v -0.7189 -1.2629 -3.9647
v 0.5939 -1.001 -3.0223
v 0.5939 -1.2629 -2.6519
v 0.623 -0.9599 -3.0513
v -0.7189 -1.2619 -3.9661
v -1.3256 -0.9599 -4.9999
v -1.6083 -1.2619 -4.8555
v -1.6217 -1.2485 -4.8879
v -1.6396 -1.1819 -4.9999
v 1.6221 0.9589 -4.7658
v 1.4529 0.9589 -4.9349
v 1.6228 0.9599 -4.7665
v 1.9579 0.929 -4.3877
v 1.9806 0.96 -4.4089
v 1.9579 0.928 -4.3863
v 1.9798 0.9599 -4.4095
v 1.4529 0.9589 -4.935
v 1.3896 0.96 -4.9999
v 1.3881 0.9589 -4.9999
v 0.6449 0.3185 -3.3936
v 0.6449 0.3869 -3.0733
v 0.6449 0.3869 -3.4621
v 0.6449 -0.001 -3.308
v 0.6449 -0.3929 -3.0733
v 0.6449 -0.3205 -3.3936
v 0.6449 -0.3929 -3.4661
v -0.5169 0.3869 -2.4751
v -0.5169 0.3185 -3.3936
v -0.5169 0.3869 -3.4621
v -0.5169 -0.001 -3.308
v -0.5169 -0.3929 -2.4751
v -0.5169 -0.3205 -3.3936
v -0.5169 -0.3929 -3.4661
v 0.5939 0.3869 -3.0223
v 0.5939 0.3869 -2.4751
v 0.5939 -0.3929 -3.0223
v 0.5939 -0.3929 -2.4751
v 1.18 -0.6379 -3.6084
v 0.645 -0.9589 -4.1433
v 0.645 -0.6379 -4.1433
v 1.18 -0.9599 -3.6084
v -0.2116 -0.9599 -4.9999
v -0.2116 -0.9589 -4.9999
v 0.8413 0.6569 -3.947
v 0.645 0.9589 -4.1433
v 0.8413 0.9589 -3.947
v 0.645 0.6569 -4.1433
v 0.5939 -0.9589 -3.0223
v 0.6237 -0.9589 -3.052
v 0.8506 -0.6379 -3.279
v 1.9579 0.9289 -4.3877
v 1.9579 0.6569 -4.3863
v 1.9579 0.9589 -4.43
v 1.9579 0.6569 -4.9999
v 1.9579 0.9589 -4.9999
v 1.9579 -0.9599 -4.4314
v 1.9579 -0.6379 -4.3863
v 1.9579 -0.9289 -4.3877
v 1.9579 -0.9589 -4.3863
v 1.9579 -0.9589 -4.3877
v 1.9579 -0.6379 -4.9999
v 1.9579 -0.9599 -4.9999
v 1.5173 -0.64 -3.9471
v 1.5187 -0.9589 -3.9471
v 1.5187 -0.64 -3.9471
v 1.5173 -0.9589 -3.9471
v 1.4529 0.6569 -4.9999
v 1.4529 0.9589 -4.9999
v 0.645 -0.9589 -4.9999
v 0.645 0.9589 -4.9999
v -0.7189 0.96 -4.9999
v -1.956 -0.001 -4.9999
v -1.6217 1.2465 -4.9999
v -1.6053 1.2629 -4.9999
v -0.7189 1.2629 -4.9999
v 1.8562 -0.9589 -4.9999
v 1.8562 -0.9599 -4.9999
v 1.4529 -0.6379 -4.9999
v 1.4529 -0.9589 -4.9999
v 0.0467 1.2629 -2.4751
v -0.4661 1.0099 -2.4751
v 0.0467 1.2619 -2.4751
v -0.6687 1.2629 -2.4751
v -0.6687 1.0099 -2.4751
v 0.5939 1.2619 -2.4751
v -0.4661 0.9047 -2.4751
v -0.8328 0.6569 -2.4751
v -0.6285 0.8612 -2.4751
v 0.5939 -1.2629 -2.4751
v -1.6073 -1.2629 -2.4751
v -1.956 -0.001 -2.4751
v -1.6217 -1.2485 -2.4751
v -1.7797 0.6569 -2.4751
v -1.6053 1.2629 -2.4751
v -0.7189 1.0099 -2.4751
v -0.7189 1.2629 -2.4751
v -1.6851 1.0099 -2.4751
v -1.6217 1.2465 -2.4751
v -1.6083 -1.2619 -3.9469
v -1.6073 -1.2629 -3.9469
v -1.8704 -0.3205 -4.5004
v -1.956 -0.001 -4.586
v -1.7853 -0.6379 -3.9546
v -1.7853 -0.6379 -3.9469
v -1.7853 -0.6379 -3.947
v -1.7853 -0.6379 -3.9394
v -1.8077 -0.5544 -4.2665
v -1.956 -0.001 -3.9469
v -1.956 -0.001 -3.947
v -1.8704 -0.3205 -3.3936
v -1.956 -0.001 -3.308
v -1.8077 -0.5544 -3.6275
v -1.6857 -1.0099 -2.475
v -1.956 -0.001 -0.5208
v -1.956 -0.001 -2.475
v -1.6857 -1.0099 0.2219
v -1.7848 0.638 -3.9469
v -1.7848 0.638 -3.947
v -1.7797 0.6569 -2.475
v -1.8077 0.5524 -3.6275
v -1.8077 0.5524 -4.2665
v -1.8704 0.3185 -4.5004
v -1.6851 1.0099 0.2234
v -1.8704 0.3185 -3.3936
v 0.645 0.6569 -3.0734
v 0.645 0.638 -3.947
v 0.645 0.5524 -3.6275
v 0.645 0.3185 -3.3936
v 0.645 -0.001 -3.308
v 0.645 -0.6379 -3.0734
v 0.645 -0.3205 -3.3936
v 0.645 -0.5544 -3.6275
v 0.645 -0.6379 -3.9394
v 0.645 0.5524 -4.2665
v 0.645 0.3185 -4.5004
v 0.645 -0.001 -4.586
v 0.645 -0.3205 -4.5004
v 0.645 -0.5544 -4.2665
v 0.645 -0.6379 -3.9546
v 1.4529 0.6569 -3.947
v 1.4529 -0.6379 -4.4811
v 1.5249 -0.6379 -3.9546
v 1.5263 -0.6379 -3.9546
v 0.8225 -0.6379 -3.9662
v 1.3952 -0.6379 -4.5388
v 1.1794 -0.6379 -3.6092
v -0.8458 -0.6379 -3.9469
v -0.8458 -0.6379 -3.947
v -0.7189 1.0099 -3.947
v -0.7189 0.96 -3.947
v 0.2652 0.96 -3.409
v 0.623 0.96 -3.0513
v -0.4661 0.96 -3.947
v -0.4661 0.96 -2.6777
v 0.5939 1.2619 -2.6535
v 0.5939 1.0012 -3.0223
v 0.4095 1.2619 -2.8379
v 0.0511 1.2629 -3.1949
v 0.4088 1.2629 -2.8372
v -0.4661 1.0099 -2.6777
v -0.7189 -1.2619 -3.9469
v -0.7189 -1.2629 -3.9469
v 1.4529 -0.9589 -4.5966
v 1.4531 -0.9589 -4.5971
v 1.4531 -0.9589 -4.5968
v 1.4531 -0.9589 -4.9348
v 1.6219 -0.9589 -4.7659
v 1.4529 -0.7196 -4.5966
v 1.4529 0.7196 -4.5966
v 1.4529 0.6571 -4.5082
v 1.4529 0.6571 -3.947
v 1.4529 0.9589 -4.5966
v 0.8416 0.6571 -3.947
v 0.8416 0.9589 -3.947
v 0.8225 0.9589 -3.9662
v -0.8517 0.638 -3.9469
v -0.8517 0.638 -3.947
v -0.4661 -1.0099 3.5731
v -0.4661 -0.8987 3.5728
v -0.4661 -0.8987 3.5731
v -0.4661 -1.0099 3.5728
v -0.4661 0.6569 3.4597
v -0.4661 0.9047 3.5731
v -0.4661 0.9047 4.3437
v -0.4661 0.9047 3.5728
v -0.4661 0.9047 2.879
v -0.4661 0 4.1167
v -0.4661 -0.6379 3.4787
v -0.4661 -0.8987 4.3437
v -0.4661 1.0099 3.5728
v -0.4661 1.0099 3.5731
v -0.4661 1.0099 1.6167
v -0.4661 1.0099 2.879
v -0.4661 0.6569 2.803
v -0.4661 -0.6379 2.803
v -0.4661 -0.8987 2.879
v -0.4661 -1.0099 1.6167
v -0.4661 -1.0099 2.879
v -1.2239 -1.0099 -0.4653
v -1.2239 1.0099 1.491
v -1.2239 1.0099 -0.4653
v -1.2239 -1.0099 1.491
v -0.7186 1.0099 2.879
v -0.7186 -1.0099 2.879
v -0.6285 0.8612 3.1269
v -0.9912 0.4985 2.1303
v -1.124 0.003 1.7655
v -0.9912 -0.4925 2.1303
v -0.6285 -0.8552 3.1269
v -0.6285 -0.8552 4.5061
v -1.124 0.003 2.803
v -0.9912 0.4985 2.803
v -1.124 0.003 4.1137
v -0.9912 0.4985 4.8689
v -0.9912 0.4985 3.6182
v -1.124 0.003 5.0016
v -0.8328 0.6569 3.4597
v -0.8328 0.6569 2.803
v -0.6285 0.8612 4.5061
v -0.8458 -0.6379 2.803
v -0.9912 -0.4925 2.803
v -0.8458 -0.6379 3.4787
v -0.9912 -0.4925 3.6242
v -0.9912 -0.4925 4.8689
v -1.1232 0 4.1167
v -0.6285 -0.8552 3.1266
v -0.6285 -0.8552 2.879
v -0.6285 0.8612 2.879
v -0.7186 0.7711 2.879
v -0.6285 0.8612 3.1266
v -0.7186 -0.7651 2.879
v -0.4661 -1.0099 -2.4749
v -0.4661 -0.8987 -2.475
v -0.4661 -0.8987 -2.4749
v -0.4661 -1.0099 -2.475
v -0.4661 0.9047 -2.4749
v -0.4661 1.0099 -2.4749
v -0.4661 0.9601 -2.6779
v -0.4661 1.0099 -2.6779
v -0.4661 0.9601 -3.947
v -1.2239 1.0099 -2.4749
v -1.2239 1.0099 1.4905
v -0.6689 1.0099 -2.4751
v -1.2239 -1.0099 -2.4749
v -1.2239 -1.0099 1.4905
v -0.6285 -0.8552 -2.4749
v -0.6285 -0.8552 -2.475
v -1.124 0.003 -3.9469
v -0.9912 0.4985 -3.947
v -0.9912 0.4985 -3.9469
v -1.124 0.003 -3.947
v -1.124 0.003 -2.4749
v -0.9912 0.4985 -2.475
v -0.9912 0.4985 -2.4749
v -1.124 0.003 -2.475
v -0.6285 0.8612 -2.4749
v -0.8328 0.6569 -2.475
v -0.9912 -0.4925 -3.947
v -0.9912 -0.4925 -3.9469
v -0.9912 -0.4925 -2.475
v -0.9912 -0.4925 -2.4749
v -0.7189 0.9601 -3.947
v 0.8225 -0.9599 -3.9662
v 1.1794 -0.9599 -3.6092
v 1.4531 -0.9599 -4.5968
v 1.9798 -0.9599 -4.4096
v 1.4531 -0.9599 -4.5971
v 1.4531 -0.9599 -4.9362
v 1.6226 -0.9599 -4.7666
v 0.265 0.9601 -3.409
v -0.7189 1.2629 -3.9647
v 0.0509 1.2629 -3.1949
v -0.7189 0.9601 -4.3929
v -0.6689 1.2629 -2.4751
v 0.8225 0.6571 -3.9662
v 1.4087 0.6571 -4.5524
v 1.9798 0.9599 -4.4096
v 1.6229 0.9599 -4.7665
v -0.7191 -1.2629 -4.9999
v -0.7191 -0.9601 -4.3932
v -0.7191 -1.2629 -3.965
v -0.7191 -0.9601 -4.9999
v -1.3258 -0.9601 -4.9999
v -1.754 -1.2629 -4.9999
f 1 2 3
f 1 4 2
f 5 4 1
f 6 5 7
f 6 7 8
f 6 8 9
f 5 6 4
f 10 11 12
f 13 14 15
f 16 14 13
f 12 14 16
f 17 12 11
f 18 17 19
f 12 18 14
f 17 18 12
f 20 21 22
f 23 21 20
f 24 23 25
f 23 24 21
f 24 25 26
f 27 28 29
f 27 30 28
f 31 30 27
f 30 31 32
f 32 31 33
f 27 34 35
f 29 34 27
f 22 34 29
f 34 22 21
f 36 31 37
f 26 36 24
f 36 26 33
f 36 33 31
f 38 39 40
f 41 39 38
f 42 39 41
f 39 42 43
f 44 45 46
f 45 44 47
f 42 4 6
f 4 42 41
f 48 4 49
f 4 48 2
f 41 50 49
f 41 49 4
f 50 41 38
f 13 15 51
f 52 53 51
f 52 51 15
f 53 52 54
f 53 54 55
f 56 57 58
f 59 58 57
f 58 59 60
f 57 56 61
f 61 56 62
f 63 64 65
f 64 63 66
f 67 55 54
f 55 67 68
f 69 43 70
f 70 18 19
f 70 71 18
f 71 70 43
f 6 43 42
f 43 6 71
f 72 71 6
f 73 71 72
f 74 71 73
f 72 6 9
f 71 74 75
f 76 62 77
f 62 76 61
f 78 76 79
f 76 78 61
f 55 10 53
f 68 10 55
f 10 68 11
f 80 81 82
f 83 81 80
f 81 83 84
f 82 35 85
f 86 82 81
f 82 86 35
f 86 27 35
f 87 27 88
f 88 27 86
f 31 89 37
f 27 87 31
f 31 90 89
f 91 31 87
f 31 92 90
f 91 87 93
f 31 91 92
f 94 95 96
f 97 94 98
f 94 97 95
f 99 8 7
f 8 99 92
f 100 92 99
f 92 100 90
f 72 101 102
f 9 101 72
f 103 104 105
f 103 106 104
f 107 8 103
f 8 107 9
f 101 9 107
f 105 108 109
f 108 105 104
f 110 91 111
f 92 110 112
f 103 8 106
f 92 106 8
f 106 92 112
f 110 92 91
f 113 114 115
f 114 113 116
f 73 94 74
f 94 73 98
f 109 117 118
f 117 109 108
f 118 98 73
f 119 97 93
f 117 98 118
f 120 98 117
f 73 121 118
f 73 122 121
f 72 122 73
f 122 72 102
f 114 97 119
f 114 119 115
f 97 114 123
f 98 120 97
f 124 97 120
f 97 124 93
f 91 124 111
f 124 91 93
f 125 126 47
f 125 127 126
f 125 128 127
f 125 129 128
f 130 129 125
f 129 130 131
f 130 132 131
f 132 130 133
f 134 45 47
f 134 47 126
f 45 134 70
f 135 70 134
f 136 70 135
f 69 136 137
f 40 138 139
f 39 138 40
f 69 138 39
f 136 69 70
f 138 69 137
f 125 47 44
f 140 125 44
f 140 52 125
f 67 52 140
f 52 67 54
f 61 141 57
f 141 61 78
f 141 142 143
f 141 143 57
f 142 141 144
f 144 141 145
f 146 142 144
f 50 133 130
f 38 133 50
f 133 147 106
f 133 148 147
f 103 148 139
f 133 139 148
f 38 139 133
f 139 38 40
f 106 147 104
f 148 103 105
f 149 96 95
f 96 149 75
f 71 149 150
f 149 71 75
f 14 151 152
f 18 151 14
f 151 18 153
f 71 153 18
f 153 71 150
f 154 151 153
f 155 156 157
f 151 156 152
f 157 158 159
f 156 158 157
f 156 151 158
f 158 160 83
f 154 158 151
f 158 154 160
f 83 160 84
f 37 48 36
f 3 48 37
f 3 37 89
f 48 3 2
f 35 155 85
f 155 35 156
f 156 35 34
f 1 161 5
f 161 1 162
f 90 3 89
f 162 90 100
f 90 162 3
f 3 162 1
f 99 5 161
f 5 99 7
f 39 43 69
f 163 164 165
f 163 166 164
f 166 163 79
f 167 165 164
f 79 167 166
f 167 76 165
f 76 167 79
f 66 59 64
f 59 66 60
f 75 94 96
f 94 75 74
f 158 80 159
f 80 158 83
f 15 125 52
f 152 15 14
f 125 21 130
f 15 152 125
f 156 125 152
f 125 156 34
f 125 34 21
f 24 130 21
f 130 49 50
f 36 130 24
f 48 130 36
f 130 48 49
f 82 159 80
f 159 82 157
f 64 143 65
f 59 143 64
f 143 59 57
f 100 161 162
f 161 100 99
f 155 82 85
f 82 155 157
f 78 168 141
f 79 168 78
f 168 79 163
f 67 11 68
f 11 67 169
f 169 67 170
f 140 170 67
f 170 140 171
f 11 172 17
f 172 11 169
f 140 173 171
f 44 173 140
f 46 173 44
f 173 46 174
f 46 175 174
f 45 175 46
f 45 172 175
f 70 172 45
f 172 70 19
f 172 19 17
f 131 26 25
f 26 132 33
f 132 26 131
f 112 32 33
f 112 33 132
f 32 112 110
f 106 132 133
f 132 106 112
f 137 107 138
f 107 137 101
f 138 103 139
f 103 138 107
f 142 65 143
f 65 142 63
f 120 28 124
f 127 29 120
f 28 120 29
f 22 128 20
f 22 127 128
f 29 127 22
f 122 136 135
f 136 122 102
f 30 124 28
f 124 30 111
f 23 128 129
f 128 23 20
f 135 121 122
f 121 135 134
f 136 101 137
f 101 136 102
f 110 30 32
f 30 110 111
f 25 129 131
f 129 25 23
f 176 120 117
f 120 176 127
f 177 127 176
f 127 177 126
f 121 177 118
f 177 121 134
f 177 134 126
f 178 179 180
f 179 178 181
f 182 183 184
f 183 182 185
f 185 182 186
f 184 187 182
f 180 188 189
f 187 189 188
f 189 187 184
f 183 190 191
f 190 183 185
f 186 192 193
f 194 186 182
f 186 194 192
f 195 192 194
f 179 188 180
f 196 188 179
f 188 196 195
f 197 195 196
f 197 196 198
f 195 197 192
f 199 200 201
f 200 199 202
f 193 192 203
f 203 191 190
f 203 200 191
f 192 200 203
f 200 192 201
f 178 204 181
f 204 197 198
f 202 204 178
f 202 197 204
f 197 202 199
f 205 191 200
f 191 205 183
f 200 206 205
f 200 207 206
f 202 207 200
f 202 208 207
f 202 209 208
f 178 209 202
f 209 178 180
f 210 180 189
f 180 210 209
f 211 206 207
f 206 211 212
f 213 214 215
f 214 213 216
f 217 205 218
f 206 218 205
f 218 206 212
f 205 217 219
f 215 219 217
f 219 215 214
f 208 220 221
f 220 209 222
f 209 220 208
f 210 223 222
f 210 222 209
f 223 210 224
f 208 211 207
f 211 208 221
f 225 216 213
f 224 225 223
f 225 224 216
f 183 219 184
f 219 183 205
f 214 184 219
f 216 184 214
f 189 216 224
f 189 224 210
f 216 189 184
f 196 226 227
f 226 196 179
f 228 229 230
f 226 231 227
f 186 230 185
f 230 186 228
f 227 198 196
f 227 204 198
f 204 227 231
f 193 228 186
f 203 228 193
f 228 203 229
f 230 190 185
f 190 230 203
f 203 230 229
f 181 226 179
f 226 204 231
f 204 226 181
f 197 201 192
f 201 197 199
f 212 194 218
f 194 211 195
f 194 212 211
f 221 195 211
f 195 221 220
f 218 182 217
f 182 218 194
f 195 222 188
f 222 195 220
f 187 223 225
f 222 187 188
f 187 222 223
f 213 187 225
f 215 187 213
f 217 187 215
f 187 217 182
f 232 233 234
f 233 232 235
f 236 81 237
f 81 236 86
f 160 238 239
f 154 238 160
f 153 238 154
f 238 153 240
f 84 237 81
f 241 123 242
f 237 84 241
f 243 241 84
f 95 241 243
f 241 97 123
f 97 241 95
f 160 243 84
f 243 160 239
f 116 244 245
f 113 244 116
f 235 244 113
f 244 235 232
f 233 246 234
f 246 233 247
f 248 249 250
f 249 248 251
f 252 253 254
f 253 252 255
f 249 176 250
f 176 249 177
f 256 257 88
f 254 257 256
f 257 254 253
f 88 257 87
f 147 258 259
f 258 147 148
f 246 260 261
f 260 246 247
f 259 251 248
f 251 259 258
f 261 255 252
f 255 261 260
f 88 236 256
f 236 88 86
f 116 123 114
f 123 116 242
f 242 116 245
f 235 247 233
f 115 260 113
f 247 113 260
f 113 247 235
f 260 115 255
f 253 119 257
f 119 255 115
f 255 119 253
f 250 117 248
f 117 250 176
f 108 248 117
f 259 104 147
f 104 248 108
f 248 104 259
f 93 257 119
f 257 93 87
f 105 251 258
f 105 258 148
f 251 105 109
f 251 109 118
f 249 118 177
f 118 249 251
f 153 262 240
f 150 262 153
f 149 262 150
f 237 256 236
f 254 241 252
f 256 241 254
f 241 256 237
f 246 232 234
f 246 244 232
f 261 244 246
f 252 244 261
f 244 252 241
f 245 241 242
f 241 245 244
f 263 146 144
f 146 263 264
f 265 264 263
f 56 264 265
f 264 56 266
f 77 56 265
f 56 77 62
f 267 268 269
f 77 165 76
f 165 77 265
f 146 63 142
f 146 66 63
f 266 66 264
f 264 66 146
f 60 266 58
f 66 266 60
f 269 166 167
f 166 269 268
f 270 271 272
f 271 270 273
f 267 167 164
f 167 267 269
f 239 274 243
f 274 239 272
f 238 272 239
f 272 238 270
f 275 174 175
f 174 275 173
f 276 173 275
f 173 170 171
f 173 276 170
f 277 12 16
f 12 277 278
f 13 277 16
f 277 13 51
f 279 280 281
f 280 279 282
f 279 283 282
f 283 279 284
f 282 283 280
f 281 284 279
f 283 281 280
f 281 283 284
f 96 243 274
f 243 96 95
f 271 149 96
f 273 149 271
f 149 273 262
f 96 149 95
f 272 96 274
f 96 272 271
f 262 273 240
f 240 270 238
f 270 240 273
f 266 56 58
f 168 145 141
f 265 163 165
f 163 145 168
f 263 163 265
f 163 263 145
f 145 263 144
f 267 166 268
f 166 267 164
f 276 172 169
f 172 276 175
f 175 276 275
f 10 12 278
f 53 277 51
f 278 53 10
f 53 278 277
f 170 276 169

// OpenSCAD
intersection() {
  translate([-0.0005, 0, 0])
  cube(size = [4.6988, 3.0298, 11.9998], center = true);

  union() {
    intersection() {
      union() {
        difference() {
          translate([-3.896, 5.50978, 3.896])
          rotate([-135, -45, 0])
          cube(size = [36.1998, 20.6158, 36.1998], center = true);
        
          translate([0.064, -0.003, 7.0765])
          cube(size = [1.1619, 0.7799, 22.0469], center = true);
        }
      
        translate([-12.2086, -0.6765, -1.80418])
        rotate([90, 45, 0])
        cube(size = [21.4858, 16.3828, 0.5668], center = true);
      
        translate([-8.071, -0.0005, -4.4735])
        cube(size = [20.0578, 1.9188, 1.0528], center = true);
      }
    
      difference() {
        difference() {
          translate([0.539, -0.001, -3.7375])
          cylinder(h = 2.5248, r1 = 2.495, r2 = 2.495, center = true, $fn = 12);
        
          translate([9.3725, 0.0095, 6.55])
          cube(size = [17.4549, 1.2949, 23.0999], center = true);
        }
      
        difference() {
          translate([8.6905, 1.1115, -10.2875])
          cube(size = [18.8189, 0.3029, 15.6249], center = true);
        
          translate([1.71737, -5.50978, 9.50937])
          rotate([-135, -45, 0])
          cube(size = [20.323, 36.2, 20.616], center = true);
        }
      }
    
      union() {
        difference() {
          union() {
            translate([-0.0625, -1.1115, -3.7375])
            cube(size = [1.3128, 0.3028, 2.5248], center = true);
          
            translate([-12.2086, -0.151, -1.80418])
            rotate([90, 45, 0])
            cube(size = [21.4858, 16.3828, 2.2218], center = true);
          }
        
          translate([-12.2086, 0.0095, -1.80418])
          rotate([90, 45, 0])
          cube(size = [21.4859, 16.3829, 1.2949], center = true);
        }
      
        difference() {
          union() {
            translate([-7.00637, 0.152, -7.00637])
            rotate([90, 45, 0])
            cube(size = [36.1998, 16.3828, 2.2218], center = true);
          
            translate([-8.753, -0.0005, -3.211])
            cube(size = [18.6938, 2.5248, 1.4718], center = true);
          }
        
          union() {
            translate([1.049, -0.152, -4.4735])
            cube(size = [0.8079, 2.2219, 1.0529], center = true);
          
            translate([-8.071, -0.001, -3.947])
            rotate([180, 90, -180])
            cylinder(h = 20.0579, r1 = 0.639, r2 = 0.639, center = true, $fn = 12);
          }
        }
      }
    }
  
    difference() {
      intersection() {
        union() {
          difference() {
            translate([-0.845, 0, 0])
            cube(size = [0.7578, 2.0198, 36.1998], center = true);
          
            translate([-9.28416, 0, 3.37916])
            rotate([90, 20, 0])
            cube(size = [16.4399, 36.1999, 2.0199], center = true);
          }
        
          intersection() {
            translate([-0.133, 0.003, 7.8125])
            rotate([180, 0, 180])
            cylinder(h = 20.5748, r1 = 0.991, r2 = 0.991, center = true, $fn = 12);
          
            translate([-0.845, 0, 0])
            rotate([135, 0, 0])
            cube(size = [0.7578, 36.1998, 36.1998], center = true);
          }
        }
      
        translate([-5.42987, 8.545, -5.42987])
        rotate([90, 45, 0])
        cube(size = [36.1998, 20.8418, 19.1098], center = true);
      }
    
      union() {
        difference() {
          translate([7.72427, 8.545, -2.81141])
          rotate([90, 20, 0])
          cube(size = [19.7599, 36.1999, 19.1099], center = true);
        
          union() {
            translate([-0.133, 0.003, 7.8125])
            rotate([180, 0, 180])
            cylinder(h = 20.575, r1 = 0.991, r2 = 0.991, center = true, $fn = 12);
          
            translate([-9.283, 0, -7.6105])
            cube(size = [17.634, 36.2, 20.979], center = true);
          }
        }
      
        intersection() {
          union() {
            translate([8.0386, 8.545, -2.92581])
            rotate([90, 20, 0])
            cube(size = [19.0909, 36.1999, 19.1099], center = true);
          
            translate([8.438, 0.0095, 10.4515])
            cube(size = [19.3239, 1.2949, 15.2969], center = true);
          }
        
          translate([0, 0.000353553, -10.7399])
          rotate([135, 0, 0])
          cube(size = [36.1999, 21.0109, 21.0099], center = true);
        }
      }
    }
  
    difference() {
      intersection() {
        union() {
          difference() {
            translate([-9.283, 0, -7.6105])
            cube(size = [17.6338, 2.0198, 20.9788], center = true);
          
            translate([-0.133, 0.003, -7.6485])
            rotate([180, 0, 180])
            cylinder(h = 20.9029, r1 = 0.991, r2 = 0.991, center = true, $fn = 12);
          }
        
          intersection() {
            translate([-9.28416, 9.3785, 3.37916])
            rotate([90, 20, 0])
            cube(size = [16.4398, 36.1998, 17.4428], center = true);
          
            translate([-9.662, -5.36977, -5.36977])
            rotate([135, 0, 0])
            cube(size = [16.8758, 36.1998, 21.0098], center = true);
          }
        }
      
        union() {
          difference() {
            translate([7.72427, 0, -2.81141])
            rotate([90, 20, 0])
            cube(size = [19.7598, 36.1998, 2.0198], center = true);
          
            translate([-9.283, -8.7215, -3.211])
            cube(size = [17.6339, 18.7569, 1.4719], center = true);
          }
        
          difference() {
            translate([0.539, -0.001, -3.211])
            cylinder(h = 1.4718, r1 = 2.495, r2 = 2.495, center = true, $fn = 12);
          
            translate([0, -0.001, -3.947])
            rotate([180, 90, -180])
            cylinder(h = 36.1999, r1 = 0.639, r2 = 0.639, center = true, $fn = 12);
          }
        }
      }
    
      union() {
        difference() {
          translate([-9.283, 0.000353553, -10.7399])
          rotate([135, 0, 0])
          cube(size = [17.6339, 21.0109, 21.0099], center = true);
        
          translate([0.539, -0.001, -0.534])
          cylinder(h = 6.826, r1 = 2.495, r2 = 2.495, center = true, $fn = 12);
        }
      
        translate([-0.133, 0.003, -11.0235])
        rotate([180, 0, 180])
        cylinder(h = 14.1529, r1 = 0.991, r2 = 0.991, center = true, $fn = 12);
      
        translate([-0.845, 0, 0.202])
        cube(size = [0.7579, 2.0199, 5.3539], center = true);
      }
    }
  
    intersection() {
      union() {
        translate([-11.0813, -5.50978, -3.28927])
        rotate([-135, -45, 0])
        cube(size = [15.8768, 36.1998, 20.6158], center = true);
      
        translate([-7.18527, 0.0005, -7.18527])
        rotate([90, 45, 0])
        cube(size = [36.1998, 15.8768, 1.9188], center = true);
      
        translate([6.20309, 0.8085, -8.9898])
        rotate([90, 45, 0])
        cube(size = [14.7138, 0.5048, 0.3028], center = true);
      
        translate([-0.037, -9.6815, -4.4735])
        cube(size = [1.3638, 16.8368, 1.0528], center = true);
      
        difference() {
          translate([6.20309, -0.2865, -8.9898])
          rotate([90, 45, 0])
          cube(size = [14.7138, 0.5048, 1.3468], center = true);
        
          translate([9.3725, -0.125, -10.2875])
          cube(size = [17.4549, 1.0259, 15.6249], center = true);
        }
      }
    
      union() {
        difference() {
          translate([-9.4095, -1.1115, -4.4735])
          cube(size = [17.3808, 0.3028, 1.0528], center = true);
        
          translate([-14.9773, -8.88178e-16, 0.606734])
          rotate([-135, -45, 0])
          cube(size = [15.8769, 20.6159, 20.6159], center = true);
        }
      
        translate([-0.037, 1.1115, -10.2875])
        cube(size = [1.3638, 0.3028, 15.6248], center = true);
      
        translate([-9.18535, -8.88178e-16, 6.39865])
        rotate([-135, -45, 0])
        cube(size = [0.5048, 20.6158, 20.6158], center = true);
      
        translate([-0.135354, -12.7986, -2.65135])
        rotate([-135, -45, 0])
        cube(size = [0.5048, 15.5838, 20.6158], center = true);
      
        translate([1.7055, -0.7995, -4.4735])
        cube(size = [0.5048, 0.3208, 1.0528], center = true);
      
        translate([6.87137, 12.7986, 4.35537])
        rotate([-135, -45, 0])
        cube(size = [20.3228, 20.6158, 15.5838], center = true);
      }
    }
  }
}
